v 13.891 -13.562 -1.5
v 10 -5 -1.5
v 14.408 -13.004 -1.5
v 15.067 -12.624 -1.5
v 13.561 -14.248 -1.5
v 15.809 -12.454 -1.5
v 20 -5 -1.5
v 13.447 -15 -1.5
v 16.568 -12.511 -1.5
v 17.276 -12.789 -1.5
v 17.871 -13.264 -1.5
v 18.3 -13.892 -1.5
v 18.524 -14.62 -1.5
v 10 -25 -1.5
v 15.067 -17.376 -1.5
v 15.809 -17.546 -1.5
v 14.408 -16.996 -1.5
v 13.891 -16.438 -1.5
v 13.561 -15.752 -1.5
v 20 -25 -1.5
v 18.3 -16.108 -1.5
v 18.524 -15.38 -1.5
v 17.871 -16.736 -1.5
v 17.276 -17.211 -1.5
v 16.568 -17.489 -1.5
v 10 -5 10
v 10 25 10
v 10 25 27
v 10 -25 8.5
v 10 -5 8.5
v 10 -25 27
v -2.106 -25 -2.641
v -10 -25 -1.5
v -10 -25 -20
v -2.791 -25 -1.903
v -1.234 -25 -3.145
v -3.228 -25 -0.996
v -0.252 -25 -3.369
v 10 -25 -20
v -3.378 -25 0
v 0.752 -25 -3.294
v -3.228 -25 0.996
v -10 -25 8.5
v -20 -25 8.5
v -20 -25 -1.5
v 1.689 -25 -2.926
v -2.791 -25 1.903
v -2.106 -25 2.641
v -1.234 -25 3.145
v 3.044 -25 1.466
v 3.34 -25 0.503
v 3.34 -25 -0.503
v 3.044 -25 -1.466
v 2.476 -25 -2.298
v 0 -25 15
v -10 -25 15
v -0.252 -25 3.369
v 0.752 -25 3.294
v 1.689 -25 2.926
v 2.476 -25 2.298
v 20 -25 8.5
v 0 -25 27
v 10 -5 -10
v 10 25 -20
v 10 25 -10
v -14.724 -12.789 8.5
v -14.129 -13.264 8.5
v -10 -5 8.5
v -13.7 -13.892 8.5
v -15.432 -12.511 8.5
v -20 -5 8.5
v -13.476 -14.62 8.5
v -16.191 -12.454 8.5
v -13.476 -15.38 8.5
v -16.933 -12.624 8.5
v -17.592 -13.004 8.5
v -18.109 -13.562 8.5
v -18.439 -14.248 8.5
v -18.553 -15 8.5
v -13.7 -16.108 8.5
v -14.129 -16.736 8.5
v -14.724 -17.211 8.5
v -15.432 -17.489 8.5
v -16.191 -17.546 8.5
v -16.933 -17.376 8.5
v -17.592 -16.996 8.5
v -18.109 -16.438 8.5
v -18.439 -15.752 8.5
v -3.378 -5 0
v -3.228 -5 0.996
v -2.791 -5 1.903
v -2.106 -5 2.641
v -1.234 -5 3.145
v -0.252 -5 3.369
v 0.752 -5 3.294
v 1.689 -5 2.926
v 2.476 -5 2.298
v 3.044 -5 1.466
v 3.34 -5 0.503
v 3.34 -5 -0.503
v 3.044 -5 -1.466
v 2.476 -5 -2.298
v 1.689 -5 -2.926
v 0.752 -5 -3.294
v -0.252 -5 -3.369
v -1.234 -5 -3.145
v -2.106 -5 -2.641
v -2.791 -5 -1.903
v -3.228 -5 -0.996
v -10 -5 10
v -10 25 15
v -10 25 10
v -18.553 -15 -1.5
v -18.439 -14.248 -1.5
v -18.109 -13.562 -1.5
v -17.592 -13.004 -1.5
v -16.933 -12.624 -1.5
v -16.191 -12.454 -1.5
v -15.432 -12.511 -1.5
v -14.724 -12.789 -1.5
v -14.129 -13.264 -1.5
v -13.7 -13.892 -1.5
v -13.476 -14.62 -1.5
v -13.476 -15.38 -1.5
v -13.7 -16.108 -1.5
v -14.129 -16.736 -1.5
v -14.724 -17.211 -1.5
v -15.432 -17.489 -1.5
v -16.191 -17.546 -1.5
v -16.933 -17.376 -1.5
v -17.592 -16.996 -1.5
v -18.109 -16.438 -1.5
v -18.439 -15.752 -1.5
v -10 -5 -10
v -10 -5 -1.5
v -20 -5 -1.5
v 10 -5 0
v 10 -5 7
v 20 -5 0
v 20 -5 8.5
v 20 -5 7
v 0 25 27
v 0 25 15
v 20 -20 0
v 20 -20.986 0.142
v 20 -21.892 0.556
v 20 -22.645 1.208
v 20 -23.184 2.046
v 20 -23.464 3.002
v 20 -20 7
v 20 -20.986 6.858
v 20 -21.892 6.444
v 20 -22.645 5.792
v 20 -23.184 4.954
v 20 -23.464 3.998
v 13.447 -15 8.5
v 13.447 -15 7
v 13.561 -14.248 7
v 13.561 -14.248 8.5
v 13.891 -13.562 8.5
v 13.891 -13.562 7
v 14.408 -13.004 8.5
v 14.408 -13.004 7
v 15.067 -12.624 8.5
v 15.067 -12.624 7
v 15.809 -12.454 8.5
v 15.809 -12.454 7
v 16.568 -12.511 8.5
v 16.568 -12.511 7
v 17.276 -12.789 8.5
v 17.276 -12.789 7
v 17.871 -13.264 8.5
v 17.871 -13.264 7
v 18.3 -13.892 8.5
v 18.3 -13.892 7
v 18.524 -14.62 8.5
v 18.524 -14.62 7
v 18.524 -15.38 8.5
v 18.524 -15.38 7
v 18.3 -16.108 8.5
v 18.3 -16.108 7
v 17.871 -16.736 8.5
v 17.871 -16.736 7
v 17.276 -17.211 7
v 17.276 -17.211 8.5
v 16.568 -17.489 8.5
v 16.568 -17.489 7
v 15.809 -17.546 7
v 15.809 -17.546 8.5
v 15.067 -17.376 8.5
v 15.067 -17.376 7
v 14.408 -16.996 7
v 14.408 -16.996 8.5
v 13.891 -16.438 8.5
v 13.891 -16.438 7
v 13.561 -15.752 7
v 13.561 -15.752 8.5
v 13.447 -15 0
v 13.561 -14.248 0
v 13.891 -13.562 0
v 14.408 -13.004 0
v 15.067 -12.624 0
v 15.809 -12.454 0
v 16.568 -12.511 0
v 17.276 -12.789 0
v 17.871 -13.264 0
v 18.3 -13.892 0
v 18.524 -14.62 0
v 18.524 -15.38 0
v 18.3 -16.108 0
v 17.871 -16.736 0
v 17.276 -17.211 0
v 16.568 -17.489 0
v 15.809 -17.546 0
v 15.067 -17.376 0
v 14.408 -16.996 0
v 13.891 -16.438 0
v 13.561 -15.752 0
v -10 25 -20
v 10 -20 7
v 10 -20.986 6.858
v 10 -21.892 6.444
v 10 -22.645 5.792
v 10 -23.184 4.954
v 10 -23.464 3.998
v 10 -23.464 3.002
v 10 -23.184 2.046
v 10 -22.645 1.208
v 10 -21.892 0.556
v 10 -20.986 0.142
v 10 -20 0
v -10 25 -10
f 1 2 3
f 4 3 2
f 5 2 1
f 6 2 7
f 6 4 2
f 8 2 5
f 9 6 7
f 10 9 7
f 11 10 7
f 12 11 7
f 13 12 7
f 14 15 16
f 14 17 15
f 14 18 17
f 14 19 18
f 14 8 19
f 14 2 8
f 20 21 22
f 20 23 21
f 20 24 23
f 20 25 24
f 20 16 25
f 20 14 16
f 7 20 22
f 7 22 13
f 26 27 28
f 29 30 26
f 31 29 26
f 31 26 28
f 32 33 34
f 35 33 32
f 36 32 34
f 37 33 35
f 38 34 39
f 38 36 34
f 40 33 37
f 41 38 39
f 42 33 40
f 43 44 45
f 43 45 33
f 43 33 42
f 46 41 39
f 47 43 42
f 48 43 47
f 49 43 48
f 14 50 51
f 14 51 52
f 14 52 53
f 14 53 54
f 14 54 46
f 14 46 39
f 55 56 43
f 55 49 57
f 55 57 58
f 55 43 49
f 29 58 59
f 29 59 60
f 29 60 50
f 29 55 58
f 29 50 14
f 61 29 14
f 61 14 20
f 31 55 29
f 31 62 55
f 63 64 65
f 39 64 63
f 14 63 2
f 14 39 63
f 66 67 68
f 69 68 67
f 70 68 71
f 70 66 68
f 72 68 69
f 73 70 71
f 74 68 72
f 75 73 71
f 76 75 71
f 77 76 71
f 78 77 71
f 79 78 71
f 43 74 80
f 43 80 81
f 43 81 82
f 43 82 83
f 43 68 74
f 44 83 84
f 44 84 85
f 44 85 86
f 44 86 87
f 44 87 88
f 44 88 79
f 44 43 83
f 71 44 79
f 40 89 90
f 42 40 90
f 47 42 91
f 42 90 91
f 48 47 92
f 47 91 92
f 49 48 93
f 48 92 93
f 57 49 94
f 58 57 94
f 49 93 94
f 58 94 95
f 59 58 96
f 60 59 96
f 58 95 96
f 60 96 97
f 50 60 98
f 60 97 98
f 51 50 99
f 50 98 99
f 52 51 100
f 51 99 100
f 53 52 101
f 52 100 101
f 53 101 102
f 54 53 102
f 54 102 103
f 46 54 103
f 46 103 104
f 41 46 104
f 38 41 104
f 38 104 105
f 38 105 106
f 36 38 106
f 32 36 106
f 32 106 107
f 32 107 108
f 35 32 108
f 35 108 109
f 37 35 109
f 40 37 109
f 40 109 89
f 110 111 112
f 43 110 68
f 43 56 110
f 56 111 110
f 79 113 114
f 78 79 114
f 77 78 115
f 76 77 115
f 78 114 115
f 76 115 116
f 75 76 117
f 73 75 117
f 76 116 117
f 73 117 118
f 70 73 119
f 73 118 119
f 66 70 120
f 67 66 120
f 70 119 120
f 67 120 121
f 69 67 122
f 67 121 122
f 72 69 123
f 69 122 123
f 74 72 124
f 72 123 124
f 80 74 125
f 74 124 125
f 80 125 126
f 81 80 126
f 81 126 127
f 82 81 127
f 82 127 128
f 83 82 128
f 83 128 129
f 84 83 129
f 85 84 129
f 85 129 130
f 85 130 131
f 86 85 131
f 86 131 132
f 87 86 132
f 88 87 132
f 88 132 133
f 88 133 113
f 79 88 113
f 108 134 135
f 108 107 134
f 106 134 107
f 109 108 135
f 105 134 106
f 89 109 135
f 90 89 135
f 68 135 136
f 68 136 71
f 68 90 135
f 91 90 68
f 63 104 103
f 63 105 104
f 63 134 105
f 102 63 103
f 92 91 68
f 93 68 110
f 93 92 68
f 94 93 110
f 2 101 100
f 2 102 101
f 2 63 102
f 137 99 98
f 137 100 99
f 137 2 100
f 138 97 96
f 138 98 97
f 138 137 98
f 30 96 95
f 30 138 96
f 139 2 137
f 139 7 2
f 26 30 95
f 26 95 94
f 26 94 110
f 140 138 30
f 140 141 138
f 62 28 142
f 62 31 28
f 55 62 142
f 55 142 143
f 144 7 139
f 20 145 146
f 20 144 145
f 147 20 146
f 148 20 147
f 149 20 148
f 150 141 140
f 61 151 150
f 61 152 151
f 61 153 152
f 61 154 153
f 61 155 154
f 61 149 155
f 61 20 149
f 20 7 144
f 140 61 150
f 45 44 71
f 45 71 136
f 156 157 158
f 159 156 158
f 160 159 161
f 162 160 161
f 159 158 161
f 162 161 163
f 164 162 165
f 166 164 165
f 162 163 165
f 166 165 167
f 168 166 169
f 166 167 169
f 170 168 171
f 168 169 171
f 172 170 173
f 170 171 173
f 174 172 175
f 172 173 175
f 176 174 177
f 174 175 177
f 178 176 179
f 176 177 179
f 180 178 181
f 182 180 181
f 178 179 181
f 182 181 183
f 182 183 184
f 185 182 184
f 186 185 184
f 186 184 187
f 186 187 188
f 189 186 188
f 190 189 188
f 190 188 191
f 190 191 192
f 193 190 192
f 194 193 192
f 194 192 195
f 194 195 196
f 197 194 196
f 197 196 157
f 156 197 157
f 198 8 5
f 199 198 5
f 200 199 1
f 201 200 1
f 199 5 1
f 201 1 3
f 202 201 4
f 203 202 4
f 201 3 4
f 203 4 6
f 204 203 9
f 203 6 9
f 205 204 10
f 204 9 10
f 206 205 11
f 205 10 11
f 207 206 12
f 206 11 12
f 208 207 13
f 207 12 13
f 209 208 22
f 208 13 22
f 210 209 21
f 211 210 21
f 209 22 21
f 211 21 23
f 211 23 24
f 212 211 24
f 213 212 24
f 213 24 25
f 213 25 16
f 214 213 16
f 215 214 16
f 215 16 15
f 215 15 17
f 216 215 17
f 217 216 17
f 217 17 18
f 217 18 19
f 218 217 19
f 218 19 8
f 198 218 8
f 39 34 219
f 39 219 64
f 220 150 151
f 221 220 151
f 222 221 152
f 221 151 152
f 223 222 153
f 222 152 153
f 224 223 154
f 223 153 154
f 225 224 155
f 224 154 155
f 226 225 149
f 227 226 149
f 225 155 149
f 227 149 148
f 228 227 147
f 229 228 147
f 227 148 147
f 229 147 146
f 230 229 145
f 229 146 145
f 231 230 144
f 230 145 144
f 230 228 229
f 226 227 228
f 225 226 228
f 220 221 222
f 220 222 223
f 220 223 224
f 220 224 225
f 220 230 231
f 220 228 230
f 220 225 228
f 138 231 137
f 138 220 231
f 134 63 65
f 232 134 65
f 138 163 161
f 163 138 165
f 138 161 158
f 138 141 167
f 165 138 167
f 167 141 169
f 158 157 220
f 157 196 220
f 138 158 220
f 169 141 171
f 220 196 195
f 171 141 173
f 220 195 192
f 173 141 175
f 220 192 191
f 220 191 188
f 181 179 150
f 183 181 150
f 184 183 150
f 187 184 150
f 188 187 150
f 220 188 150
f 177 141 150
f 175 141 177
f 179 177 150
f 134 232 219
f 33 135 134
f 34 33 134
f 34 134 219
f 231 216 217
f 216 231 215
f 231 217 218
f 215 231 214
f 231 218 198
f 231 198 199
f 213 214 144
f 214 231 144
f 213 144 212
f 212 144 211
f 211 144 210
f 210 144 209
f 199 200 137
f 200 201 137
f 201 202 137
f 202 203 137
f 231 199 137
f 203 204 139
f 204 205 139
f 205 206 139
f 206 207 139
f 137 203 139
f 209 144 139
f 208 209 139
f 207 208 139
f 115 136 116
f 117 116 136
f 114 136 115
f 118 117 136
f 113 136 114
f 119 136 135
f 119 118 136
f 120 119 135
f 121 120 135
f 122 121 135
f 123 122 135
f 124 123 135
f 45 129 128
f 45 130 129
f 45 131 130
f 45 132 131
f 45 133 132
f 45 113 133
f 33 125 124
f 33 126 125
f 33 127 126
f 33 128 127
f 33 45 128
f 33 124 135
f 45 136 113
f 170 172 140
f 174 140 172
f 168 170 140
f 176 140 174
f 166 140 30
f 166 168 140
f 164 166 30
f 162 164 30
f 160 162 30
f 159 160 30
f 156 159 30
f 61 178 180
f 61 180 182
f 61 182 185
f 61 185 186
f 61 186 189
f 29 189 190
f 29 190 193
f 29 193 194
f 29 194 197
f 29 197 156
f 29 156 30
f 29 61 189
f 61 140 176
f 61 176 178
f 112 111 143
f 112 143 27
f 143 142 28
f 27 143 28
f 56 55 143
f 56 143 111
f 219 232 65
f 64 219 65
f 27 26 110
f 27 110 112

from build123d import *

# Parameters (mm, degrees)
F1_DEPTH = 25
F3_D     = 6.7564
F4_W     = 69.7505115181
F4_H     = 20
F5_DEPTH = 40.001
F7_DEPTH = 10
F9_D     = 5.1054


# Not quite as in the source:
# - a feature names something its author has since deleted; it is built from what else it names


with BuildPart() as f1:
    # F0 (on Front) → F1 (new body, symmetric)
    with BuildSketch(Plane.XZ):
        Polygon((10, 27), (0, 27), (0, 15), (-10, 15), (-10, 8.5), (-20, 8.5), (-20, -1.5), (-10, -1.5), (-10, -20), (10, -20), (10, -1.5), (20, -1.5), (20, 8.5), (10, 8.5), align=None)
    extrude(amount=F1_DEPTH, both=True)

    # F3 (through all)
    with Locations(Plane.XZ.offset(25)):
        with Locations((0, 0)):
            Hole(F3_D / 2)

    # F4 (on face) → F5 (cut, through all)
    with BuildSketch(Plane.YZ.offset(20)):
        with Locations((29.875255759, 0)):
            Rectangle(F4_W, F4_H)
    extrude(amount=-F5_DEPTH, mode=Mode.SUBTRACT)

    # F6 (on face) → F7 (cut)
    with BuildSketch(Plane.YZ.offset(20)):
        with BuildLine():
            ThreePointArc((-20, 7), (-23.5, 3.5), (-20, 0))
            Line((-20, 0), (-5, 0))
            Line((-5, 0), (-5, 7))
            Line((-5, 7), (-20, 7))
        make_face()
    extrude(amount=-F7_DEPTH, mode=Mode.SUBTRACT)

    # F9 (through all)
    with Locations(Plane.XY.offset(8.5)):
        with Locations((16, -15), (-16, -15)):
            Hole(F9_D / 2)


solid = f1.part
